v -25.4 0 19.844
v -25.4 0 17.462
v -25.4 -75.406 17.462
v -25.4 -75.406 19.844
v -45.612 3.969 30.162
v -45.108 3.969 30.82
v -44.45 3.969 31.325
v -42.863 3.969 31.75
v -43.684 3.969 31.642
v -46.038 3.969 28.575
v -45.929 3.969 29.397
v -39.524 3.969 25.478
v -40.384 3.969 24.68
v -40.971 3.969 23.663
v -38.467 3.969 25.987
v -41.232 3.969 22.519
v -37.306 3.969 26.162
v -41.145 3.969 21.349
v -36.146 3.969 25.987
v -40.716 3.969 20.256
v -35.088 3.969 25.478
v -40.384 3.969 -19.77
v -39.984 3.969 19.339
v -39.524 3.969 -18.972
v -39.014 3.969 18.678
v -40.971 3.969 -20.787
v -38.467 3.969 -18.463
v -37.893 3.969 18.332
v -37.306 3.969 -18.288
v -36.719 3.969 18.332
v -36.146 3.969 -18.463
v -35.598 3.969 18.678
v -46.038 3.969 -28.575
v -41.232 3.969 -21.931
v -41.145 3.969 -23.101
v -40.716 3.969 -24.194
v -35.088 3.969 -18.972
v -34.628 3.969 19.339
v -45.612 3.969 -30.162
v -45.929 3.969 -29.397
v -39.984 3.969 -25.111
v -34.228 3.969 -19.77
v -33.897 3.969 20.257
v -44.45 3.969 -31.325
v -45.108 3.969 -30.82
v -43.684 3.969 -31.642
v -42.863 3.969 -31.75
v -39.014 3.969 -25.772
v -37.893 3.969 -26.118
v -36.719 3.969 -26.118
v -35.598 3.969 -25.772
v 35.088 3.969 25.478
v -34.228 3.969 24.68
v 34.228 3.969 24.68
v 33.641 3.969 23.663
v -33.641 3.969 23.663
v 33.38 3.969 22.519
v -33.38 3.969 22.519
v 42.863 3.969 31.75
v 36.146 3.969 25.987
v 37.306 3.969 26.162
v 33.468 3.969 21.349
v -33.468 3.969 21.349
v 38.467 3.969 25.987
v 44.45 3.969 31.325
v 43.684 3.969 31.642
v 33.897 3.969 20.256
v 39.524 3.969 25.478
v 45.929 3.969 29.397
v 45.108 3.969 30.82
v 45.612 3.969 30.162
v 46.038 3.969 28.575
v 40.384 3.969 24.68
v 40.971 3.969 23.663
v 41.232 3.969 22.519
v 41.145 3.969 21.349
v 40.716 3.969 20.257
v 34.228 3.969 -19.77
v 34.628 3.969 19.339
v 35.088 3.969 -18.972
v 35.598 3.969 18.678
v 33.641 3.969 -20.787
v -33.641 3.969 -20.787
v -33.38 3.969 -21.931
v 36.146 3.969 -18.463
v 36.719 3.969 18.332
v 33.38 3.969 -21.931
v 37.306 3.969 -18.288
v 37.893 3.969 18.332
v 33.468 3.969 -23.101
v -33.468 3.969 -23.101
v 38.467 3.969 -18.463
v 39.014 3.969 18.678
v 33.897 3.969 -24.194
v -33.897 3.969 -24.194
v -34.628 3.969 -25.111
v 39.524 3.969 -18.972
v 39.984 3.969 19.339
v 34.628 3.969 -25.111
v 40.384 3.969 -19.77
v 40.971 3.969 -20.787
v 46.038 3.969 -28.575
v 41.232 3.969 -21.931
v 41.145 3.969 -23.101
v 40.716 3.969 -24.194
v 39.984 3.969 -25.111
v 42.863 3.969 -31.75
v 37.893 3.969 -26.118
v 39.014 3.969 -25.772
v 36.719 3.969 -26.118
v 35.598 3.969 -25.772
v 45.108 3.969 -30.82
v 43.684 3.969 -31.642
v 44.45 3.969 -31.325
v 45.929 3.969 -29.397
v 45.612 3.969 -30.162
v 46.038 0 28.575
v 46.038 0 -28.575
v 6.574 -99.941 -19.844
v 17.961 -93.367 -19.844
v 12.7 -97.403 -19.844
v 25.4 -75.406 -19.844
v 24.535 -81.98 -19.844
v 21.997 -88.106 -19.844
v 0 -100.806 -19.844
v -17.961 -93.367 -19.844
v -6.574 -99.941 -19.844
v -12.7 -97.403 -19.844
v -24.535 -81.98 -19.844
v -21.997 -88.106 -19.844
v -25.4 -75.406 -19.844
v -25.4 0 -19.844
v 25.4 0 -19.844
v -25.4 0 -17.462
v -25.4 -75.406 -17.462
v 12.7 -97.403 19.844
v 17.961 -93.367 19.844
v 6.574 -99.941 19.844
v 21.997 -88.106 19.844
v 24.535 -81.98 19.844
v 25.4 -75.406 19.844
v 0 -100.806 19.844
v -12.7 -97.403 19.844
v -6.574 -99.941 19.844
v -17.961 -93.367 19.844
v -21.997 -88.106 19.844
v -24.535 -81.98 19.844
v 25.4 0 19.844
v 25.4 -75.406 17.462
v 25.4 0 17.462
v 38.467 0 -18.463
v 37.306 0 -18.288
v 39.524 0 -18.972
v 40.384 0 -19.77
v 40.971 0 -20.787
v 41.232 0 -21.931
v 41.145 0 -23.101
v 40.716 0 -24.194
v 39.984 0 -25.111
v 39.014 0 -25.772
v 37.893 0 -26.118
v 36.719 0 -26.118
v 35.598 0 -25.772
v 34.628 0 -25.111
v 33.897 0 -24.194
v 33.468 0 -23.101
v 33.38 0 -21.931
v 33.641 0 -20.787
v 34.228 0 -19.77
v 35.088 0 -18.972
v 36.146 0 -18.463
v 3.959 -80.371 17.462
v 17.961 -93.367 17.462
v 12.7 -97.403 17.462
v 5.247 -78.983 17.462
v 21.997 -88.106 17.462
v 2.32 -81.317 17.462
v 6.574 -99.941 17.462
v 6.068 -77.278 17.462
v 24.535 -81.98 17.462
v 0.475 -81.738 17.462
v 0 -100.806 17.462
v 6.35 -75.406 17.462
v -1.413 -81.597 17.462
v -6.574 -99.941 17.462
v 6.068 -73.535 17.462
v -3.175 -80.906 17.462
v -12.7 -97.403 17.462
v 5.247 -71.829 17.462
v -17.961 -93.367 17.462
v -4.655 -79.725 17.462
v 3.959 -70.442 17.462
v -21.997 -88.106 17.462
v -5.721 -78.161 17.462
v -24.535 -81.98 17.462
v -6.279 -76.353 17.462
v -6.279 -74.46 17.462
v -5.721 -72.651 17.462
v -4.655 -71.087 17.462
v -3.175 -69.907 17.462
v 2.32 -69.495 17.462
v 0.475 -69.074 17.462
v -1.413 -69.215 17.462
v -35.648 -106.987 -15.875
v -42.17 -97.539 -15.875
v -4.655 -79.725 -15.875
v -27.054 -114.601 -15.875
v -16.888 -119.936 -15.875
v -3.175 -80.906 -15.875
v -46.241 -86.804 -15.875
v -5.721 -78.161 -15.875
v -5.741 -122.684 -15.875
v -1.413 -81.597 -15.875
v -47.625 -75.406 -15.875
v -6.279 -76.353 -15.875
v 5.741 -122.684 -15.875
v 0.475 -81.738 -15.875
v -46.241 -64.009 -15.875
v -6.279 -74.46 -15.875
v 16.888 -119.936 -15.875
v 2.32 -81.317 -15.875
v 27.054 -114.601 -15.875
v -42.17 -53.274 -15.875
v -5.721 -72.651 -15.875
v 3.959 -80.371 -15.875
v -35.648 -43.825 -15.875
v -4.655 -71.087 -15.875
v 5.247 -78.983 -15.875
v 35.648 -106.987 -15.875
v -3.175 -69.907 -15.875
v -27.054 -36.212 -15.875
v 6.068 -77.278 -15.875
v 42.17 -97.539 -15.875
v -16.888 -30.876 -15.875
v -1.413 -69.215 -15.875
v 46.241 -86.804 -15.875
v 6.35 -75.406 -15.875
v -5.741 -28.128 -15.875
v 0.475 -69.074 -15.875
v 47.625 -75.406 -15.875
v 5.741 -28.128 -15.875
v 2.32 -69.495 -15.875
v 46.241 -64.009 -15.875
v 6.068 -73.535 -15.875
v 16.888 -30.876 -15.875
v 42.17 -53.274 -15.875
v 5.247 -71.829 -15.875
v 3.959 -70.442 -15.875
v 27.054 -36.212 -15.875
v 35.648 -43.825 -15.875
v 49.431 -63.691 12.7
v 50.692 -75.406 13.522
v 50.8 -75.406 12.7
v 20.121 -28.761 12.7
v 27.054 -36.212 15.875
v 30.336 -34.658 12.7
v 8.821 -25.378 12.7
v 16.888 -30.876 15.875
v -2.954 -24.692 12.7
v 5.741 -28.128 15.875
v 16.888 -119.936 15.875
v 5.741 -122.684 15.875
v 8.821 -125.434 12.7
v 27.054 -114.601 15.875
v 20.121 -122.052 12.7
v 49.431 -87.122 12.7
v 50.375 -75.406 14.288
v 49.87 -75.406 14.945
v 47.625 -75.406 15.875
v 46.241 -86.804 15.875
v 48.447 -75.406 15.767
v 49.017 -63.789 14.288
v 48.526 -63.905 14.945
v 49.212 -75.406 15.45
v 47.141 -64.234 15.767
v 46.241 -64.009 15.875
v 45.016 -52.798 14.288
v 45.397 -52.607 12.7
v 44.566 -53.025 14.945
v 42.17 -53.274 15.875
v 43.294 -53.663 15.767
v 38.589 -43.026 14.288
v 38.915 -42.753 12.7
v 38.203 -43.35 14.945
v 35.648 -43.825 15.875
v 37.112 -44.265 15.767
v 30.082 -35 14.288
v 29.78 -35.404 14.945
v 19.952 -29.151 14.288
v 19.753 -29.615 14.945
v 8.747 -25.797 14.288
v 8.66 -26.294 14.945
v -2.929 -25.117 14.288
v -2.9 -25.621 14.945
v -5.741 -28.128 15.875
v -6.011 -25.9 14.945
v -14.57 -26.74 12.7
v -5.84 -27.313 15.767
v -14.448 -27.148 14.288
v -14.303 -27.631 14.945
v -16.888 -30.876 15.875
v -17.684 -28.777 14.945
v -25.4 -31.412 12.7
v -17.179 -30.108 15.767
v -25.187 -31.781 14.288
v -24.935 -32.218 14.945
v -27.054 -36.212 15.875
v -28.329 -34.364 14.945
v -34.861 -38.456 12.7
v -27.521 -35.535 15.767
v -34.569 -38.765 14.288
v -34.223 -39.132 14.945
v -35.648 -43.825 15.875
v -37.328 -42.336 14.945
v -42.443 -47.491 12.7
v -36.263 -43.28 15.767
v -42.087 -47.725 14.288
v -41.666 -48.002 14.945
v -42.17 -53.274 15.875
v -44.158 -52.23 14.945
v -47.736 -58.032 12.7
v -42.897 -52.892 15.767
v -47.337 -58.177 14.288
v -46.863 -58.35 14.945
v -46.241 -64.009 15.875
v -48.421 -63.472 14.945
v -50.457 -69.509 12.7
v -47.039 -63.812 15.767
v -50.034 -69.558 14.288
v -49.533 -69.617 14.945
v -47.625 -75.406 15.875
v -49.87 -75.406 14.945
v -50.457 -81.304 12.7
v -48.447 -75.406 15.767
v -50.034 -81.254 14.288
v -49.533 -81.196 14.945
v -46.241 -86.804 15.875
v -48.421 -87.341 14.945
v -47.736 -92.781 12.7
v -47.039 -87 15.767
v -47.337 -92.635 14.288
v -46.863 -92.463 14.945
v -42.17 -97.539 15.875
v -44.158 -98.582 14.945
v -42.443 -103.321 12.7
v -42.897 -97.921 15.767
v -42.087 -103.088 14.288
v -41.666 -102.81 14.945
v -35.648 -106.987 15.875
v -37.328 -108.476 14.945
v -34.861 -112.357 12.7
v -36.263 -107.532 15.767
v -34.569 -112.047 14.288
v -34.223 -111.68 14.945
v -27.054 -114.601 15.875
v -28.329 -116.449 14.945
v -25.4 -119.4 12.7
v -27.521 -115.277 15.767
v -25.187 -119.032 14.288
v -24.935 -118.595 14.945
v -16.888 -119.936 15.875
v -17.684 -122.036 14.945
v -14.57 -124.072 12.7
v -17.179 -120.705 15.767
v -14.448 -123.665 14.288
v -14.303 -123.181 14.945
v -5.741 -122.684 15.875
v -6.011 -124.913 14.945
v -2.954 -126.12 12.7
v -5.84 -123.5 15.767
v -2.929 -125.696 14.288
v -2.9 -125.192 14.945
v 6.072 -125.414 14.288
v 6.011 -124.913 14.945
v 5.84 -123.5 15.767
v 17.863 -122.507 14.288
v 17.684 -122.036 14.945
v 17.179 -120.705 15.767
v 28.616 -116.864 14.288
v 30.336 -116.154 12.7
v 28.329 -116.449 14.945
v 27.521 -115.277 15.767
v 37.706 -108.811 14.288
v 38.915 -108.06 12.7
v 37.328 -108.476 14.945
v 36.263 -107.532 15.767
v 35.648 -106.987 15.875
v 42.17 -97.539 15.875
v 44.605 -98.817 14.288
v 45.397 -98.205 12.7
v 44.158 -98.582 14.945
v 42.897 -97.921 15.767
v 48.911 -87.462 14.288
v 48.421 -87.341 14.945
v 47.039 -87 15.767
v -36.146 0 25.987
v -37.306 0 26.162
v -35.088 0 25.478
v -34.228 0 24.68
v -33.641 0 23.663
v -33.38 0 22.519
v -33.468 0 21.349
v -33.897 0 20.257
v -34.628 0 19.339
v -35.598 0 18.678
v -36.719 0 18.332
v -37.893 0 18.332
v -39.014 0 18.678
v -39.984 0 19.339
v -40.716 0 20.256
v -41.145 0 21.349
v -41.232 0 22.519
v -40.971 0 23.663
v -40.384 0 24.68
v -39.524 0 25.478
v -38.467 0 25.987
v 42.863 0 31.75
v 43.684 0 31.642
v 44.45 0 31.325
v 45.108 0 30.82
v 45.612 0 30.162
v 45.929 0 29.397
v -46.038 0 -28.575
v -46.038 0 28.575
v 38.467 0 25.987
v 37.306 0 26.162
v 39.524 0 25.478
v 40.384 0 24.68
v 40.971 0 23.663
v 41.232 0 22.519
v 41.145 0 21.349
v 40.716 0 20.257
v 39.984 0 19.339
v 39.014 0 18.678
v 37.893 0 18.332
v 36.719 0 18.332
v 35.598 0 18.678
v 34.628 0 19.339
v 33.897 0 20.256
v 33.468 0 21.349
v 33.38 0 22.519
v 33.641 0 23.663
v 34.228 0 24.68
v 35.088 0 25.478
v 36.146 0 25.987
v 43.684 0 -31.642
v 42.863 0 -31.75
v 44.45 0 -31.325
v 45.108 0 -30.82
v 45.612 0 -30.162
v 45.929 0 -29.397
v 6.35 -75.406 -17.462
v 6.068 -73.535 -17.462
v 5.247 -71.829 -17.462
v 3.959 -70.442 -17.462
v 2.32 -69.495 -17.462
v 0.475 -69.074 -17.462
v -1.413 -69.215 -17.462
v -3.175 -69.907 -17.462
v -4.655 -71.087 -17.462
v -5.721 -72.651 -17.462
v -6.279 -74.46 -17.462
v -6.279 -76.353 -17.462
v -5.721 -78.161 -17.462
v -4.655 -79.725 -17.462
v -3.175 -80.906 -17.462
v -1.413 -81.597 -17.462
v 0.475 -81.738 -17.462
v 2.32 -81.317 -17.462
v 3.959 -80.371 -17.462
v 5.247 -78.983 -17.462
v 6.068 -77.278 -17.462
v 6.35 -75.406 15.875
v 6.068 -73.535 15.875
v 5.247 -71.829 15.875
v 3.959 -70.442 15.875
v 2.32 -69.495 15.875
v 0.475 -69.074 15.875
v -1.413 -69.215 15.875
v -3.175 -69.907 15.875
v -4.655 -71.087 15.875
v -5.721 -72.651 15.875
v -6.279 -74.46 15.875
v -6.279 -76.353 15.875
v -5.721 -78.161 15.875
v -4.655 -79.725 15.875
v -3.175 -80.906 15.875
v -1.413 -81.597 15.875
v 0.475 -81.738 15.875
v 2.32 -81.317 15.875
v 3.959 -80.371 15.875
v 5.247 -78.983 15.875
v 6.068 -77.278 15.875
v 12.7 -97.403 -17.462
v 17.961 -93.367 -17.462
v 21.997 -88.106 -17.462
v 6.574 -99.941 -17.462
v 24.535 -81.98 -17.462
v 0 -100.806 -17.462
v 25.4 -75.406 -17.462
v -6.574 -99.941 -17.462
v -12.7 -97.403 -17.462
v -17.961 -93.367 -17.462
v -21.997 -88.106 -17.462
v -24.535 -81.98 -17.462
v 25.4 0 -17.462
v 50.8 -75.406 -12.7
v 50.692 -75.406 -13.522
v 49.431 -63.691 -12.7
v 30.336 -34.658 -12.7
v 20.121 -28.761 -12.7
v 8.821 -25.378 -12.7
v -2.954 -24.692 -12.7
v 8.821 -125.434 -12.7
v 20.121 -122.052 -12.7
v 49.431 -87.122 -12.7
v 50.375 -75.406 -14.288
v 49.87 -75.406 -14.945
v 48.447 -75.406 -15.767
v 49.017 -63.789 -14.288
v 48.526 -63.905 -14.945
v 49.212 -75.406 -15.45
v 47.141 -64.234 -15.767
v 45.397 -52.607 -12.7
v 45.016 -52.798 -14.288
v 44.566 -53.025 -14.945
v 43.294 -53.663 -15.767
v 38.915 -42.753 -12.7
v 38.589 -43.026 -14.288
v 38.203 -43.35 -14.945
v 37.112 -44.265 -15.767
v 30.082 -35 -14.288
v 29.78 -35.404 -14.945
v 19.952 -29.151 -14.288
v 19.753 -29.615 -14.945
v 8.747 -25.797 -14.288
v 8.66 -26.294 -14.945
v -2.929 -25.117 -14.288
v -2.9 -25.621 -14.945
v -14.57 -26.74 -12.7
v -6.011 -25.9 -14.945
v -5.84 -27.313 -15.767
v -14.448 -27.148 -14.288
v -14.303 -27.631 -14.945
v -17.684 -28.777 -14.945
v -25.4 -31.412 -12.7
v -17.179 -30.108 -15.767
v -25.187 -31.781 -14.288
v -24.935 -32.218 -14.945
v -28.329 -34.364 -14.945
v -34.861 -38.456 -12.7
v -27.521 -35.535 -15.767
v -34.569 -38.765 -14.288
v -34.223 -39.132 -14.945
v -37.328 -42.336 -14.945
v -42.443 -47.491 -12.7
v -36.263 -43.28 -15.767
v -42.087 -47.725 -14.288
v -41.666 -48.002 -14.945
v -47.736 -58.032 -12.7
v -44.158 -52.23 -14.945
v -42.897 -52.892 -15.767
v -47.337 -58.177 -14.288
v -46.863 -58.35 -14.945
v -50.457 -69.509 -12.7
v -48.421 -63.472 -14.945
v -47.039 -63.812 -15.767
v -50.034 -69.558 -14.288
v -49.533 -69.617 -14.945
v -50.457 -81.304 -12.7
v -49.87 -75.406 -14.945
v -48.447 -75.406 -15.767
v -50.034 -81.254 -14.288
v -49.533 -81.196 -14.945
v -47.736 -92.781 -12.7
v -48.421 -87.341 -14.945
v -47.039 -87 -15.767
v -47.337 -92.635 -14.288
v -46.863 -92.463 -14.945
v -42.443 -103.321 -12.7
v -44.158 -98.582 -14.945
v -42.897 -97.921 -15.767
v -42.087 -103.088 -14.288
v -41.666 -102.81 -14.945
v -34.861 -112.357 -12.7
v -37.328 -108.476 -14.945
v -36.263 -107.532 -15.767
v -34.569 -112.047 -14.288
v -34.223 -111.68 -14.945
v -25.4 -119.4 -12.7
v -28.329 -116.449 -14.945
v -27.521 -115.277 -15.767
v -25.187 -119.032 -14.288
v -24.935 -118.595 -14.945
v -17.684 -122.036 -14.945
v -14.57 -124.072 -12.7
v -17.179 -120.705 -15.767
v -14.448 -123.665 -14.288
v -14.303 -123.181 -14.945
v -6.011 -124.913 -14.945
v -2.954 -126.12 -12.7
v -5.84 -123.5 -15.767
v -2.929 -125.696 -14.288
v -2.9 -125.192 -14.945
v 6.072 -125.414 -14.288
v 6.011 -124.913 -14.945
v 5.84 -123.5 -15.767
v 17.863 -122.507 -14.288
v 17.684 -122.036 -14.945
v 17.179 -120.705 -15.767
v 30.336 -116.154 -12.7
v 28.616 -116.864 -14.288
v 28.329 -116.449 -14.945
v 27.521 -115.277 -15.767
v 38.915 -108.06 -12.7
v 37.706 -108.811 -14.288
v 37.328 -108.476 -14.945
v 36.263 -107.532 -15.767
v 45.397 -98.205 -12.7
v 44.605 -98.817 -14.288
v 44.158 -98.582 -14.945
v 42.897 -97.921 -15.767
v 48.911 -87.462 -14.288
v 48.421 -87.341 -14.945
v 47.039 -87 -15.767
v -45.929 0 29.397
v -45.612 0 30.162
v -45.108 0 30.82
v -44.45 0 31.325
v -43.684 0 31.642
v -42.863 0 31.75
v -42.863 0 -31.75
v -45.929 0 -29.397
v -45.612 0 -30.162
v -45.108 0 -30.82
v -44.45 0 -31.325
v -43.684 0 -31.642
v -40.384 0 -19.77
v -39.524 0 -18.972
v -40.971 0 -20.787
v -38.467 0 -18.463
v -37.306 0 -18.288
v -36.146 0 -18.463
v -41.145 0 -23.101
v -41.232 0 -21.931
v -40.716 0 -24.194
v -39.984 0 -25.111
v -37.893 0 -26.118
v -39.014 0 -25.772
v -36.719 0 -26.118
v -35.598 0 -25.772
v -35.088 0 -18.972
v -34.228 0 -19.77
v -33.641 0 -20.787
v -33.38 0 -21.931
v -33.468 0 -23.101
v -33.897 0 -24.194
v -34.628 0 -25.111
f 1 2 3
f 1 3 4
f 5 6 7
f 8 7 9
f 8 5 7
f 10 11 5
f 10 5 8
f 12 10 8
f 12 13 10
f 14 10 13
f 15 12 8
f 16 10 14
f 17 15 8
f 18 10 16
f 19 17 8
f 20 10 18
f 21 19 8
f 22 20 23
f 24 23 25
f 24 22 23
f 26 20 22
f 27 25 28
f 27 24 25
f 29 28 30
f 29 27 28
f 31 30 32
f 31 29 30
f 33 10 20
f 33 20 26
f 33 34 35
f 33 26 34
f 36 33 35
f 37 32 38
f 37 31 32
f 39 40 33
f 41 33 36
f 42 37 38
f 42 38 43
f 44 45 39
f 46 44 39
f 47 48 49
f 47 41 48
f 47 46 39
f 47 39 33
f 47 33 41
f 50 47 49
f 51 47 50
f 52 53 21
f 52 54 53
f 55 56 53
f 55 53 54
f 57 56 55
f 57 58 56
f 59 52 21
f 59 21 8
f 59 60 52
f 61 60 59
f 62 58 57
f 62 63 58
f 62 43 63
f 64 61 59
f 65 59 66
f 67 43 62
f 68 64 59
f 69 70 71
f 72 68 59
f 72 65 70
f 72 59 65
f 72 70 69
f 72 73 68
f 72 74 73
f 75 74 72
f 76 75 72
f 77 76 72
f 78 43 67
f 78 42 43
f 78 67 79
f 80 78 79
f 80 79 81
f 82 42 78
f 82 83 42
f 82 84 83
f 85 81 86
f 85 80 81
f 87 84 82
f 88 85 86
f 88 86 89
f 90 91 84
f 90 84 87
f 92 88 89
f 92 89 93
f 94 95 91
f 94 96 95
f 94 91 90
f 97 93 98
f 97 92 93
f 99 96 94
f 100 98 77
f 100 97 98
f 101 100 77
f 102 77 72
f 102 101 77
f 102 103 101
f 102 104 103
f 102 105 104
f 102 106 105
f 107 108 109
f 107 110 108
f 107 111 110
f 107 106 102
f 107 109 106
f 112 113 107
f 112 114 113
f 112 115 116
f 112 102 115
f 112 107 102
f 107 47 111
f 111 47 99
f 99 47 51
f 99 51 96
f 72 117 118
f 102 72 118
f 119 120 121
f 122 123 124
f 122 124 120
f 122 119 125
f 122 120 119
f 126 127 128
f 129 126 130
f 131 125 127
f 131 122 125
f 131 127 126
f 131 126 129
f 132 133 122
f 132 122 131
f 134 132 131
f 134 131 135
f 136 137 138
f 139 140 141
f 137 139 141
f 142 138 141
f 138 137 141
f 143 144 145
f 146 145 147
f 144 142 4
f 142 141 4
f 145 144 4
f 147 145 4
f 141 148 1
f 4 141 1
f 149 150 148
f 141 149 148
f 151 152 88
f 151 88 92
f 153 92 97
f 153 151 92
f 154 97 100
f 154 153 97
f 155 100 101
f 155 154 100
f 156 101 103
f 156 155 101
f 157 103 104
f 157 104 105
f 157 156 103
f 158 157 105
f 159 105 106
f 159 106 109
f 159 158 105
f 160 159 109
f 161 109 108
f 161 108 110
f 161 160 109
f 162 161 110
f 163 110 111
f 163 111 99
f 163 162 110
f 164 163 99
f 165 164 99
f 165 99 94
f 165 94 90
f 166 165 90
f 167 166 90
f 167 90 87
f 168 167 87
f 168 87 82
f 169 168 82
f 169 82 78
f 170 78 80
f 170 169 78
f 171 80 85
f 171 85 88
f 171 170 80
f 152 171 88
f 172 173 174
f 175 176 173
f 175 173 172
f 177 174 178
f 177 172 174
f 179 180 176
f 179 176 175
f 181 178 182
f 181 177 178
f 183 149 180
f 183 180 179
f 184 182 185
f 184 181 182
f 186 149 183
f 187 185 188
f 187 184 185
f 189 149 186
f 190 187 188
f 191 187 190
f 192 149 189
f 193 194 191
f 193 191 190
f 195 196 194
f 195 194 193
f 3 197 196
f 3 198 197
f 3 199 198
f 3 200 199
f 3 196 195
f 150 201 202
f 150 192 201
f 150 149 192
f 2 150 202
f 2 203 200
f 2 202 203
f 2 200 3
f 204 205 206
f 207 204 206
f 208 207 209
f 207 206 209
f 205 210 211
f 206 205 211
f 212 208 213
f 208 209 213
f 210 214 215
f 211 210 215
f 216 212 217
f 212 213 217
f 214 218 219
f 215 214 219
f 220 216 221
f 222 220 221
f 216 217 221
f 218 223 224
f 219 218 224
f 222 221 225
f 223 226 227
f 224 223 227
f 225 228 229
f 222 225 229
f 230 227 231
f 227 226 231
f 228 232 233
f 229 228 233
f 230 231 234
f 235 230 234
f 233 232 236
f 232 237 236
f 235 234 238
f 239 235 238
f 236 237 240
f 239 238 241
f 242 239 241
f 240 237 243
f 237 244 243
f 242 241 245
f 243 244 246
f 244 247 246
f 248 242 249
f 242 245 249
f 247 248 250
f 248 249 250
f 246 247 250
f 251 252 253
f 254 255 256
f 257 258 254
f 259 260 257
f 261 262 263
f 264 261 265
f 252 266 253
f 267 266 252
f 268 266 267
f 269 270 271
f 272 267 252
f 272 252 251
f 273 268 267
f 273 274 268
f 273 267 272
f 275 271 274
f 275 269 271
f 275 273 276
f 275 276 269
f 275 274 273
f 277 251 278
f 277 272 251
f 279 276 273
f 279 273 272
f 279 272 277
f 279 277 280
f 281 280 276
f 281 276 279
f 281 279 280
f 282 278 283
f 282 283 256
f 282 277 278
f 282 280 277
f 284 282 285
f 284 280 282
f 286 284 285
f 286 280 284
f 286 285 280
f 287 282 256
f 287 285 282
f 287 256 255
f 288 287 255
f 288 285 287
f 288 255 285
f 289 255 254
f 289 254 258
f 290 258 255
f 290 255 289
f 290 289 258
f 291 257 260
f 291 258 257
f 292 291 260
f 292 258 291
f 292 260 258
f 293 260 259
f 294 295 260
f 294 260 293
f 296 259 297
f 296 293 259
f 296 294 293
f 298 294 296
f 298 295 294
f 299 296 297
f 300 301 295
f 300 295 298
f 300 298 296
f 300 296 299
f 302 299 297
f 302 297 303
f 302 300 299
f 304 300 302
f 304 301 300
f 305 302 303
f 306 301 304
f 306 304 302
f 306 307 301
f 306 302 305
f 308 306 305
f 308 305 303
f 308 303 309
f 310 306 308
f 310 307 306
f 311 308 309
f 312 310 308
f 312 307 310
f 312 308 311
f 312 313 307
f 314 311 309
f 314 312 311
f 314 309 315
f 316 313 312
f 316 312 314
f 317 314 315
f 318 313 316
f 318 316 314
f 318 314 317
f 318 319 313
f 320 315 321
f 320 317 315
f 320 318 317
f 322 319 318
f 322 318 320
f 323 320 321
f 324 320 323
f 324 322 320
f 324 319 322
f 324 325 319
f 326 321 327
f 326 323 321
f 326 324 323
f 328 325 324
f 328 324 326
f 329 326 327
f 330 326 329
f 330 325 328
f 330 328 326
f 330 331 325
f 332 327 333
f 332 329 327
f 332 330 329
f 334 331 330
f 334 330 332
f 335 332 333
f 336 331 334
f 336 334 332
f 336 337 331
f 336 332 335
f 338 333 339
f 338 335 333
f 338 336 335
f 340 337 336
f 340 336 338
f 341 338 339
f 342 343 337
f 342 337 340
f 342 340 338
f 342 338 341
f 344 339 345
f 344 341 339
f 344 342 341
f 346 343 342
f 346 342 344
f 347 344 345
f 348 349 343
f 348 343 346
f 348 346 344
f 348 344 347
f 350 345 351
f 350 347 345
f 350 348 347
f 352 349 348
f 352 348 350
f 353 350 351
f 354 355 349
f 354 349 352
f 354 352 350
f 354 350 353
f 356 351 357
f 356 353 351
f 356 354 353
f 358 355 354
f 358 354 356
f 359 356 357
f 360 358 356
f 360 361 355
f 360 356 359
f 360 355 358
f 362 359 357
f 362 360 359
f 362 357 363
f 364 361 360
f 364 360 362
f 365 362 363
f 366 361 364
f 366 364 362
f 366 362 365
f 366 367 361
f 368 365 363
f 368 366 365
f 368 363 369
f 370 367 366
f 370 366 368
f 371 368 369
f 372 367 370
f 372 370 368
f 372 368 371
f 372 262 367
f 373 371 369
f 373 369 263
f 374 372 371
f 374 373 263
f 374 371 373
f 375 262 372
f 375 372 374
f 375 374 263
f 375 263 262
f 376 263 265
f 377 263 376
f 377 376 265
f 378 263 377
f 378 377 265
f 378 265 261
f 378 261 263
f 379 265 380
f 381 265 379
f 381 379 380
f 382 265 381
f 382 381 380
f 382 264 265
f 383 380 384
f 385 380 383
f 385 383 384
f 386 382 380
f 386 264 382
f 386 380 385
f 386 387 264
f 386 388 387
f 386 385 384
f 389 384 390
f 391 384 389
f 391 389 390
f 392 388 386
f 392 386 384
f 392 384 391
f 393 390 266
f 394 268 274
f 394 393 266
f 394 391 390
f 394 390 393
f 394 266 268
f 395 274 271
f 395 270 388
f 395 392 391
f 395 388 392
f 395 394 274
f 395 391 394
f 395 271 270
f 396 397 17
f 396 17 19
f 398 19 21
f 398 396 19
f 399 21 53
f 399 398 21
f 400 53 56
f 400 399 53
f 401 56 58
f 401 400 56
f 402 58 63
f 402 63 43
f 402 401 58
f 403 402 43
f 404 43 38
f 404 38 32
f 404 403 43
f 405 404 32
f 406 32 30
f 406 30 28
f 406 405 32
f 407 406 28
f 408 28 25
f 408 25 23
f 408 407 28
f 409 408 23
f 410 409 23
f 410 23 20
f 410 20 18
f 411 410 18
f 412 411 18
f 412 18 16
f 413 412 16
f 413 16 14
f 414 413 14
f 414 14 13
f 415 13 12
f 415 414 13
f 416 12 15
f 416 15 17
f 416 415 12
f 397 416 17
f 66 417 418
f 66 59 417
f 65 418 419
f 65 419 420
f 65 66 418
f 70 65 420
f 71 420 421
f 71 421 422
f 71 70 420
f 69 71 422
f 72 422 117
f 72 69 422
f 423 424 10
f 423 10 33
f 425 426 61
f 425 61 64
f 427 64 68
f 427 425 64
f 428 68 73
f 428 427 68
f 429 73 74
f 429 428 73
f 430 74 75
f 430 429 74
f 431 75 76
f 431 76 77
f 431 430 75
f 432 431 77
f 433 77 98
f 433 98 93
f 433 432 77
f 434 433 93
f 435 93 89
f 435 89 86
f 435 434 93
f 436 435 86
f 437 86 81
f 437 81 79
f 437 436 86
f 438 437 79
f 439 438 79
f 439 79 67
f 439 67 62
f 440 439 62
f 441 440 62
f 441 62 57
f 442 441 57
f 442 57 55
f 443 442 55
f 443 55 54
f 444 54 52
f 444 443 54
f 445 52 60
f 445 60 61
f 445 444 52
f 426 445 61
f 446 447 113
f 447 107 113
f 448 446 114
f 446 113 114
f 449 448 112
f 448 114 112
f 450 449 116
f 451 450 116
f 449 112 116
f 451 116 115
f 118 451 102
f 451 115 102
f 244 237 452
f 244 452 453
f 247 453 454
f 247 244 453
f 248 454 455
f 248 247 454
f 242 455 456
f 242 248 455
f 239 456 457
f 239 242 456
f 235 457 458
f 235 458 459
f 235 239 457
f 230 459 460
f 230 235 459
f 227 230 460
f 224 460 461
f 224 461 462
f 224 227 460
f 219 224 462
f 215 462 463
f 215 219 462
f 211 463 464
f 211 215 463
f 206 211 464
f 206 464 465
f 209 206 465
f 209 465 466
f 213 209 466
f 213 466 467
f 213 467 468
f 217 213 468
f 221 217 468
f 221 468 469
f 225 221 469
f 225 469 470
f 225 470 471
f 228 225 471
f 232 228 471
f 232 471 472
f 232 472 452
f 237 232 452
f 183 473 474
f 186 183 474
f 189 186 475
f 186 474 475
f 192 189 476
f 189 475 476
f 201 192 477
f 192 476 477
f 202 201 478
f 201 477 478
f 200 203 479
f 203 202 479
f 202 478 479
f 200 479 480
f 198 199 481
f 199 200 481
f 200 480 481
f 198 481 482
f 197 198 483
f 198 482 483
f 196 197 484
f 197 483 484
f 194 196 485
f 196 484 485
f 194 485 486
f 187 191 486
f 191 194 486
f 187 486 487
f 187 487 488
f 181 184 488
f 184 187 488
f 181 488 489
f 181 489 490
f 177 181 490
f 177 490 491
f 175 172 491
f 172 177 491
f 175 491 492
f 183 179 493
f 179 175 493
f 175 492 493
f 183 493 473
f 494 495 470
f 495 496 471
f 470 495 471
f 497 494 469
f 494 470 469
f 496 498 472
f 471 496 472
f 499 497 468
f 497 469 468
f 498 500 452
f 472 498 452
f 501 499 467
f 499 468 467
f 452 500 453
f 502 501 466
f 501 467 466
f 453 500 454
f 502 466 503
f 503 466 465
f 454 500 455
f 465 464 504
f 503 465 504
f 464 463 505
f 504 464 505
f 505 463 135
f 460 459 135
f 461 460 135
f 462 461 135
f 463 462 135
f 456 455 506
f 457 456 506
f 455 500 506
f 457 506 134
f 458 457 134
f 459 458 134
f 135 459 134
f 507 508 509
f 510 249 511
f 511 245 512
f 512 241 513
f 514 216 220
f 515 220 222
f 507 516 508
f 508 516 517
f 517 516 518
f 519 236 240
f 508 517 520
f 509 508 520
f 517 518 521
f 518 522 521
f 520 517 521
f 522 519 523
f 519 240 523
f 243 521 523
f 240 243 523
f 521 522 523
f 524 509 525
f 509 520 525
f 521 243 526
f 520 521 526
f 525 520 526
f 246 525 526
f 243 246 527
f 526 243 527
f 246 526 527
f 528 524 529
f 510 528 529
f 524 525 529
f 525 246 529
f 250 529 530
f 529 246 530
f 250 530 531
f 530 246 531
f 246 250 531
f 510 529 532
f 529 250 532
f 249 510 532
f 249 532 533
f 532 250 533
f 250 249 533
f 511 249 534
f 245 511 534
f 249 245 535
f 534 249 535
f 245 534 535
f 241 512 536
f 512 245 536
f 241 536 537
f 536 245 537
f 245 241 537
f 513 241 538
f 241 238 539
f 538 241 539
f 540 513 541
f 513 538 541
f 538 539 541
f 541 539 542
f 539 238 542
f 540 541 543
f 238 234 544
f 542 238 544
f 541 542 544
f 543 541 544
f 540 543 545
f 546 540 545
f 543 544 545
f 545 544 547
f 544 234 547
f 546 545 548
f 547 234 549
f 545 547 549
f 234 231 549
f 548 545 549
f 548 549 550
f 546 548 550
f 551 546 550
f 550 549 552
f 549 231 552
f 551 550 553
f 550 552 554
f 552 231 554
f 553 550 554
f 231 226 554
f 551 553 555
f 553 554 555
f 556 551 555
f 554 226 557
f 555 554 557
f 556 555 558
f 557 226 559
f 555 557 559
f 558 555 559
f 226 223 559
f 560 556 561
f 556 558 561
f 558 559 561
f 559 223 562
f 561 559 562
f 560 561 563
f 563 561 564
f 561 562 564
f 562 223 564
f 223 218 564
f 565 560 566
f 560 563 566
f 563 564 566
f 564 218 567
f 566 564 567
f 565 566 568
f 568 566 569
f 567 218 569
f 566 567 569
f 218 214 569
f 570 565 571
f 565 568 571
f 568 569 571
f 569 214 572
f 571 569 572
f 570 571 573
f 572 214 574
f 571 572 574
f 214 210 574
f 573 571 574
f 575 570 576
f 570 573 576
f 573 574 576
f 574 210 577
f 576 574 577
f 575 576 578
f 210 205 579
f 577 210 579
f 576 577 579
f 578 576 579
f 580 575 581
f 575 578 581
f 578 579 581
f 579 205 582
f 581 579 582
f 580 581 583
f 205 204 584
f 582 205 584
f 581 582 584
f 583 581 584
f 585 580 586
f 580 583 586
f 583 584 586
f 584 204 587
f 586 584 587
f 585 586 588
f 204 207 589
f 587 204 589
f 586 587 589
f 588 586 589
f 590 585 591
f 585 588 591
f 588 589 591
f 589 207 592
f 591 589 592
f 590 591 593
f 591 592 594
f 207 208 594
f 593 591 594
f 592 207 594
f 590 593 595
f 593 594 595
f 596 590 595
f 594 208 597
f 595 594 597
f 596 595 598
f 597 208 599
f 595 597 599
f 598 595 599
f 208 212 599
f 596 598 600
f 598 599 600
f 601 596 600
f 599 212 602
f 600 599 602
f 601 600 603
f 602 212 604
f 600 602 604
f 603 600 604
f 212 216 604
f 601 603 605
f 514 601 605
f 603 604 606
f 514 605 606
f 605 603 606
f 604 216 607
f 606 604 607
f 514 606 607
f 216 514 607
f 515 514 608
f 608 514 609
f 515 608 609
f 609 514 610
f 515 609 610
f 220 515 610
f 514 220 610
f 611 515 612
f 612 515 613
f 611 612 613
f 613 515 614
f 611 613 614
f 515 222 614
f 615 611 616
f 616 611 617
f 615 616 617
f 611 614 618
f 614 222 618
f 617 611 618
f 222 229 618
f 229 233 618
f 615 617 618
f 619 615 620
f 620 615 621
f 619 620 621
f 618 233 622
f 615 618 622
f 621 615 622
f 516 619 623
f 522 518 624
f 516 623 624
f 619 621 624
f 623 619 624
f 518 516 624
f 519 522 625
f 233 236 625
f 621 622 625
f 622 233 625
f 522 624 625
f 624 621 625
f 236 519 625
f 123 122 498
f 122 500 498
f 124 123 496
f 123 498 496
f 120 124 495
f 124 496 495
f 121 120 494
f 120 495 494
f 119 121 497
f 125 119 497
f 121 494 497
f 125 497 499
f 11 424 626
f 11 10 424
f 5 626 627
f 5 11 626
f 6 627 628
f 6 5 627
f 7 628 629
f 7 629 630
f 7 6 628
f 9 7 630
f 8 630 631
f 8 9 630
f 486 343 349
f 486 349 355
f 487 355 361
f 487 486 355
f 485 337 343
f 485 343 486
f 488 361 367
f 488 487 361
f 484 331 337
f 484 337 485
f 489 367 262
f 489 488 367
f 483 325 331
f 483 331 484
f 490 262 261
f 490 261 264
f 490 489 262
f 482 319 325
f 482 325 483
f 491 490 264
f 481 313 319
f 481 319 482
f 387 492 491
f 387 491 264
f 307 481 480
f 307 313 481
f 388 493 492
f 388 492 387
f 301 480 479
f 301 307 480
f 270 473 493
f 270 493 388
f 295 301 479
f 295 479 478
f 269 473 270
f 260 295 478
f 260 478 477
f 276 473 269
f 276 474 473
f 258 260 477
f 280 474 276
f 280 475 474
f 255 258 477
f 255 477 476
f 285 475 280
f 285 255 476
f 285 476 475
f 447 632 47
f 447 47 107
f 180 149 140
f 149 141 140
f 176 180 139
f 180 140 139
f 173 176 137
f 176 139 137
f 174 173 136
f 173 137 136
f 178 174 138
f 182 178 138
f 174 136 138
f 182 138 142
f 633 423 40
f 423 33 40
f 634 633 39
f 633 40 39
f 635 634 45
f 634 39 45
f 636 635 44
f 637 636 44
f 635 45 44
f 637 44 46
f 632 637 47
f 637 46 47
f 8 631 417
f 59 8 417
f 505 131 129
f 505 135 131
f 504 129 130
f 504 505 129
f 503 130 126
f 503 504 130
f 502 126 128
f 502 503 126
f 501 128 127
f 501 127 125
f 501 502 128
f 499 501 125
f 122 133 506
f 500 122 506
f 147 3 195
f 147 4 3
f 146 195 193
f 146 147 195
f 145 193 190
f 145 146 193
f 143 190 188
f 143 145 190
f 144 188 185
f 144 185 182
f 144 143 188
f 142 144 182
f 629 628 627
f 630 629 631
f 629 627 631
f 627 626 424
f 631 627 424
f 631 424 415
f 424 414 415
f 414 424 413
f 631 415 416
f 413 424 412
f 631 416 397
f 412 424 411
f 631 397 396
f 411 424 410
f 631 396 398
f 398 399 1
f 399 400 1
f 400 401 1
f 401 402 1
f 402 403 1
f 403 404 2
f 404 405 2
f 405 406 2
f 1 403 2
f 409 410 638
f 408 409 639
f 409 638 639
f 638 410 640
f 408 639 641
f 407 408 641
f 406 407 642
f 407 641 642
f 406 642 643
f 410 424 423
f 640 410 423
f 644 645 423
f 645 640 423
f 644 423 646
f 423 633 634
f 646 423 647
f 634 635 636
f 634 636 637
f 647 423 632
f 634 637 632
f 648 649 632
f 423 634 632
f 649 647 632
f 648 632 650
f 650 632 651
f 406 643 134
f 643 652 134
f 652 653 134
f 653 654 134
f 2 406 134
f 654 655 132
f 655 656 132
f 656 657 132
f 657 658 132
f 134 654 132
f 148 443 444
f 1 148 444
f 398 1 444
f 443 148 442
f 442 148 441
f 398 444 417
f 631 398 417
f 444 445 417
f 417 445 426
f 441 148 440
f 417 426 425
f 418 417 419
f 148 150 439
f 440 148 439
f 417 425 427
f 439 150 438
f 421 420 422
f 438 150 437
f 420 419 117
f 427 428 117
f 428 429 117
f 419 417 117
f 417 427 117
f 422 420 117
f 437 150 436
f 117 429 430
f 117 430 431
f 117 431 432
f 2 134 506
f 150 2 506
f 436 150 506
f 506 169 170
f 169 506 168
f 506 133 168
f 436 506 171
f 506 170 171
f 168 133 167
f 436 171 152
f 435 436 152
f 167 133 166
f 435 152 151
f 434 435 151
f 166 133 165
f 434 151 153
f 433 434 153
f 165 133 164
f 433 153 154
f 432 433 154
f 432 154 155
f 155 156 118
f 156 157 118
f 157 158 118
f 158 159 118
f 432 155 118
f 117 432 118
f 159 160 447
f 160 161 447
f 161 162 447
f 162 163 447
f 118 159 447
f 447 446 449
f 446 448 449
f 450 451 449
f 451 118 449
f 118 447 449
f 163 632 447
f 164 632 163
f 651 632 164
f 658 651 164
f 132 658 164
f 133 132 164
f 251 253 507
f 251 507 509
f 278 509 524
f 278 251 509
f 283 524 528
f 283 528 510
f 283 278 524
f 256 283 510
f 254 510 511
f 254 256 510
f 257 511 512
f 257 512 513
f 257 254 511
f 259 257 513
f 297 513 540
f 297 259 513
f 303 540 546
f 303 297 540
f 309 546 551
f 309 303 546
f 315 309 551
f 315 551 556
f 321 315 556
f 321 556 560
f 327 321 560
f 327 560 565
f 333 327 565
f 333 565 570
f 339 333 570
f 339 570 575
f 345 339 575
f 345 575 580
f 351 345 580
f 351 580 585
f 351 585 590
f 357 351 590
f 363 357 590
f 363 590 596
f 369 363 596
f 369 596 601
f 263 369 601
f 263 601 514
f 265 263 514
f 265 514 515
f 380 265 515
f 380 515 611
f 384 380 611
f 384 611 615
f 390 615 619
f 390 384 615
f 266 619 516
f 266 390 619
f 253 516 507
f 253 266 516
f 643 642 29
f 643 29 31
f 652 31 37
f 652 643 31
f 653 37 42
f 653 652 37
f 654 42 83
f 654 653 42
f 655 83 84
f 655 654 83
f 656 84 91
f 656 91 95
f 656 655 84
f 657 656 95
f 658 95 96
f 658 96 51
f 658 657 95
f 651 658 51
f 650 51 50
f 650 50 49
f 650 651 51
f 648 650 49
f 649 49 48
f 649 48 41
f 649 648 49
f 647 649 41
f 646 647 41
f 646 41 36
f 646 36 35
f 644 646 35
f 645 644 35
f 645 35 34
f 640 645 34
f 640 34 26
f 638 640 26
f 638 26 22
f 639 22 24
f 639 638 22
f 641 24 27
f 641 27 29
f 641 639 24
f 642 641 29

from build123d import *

# Parameters (mm, degrees)
SKETCH1_W                  = 92.075
SKETCH1_H                  = 63.5
SKETCH1_R                  = 3.937
EXTRUDE1_DEPTH             = 3.96875
SKETCH2_W                  = 50.8
SKETCH2_H                  = 2.38125
EXTRUDE2_DEPTH             = 100.80625
FILLET1_R                  = 25.4
EXTRUDE3_REACH             = 117.28
SKETCH3_R                  = 6.35
EXTRUDE3_DIRECTION_2_REACH = 117.28
SKETCH4_R                  = 50.8
EXTRUDE4_DEPTH             = 15.875
FILLET2_R                  = 3.175
FILLET3_R                  = 3.175


with BuildPart() as part:
    # Sketch1 → Extrude1 (new body)
    with BuildSketch(Plane(origin=(0, 0, 0), x_dir=(1, 0, 0), z_dir=(0, 1, 0))):
        Rectangle(SKETCH1_W, SKETCH1_H)
        with Locations(Location((-37.30625, 22.225, 0), (0, 0, 270))):
            Circle(SKETCH1_R, mode=Mode.SUBTRACT)
        with Locations(Location((-37.30625, -22.225, 0), (0, 0, 270))):
            Circle(SKETCH1_R, mode=Mode.SUBTRACT)
        with Locations(Location((37.30625, -22.225, 0), (0, 0, 270))):
            Circle(SKETCH1_R, mode=Mode.SUBTRACT)
        with Locations(Location((37.30625, 22.225, 0), (0, 0, 270))):
            Circle(SKETCH1_R, mode=Mode.SUBTRACT)
    extrude(amount=EXTRUDE1_DEPTH)

    # Sketch2 → Extrude2 (add)
    with BuildSketch(Plane(origin=(0, 0, 0), x_dir=(-1, 0, 0), z_dir=(0, 1, 0))):
        with Locations((0, 18.653125)):
            Rectangle(SKETCH2_W, SKETCH2_H)
        with Locations((0, -18.653125)):
            Rectangle(SKETCH2_W, SKETCH2_H)
    extrude(amount=-EXTRUDE2_DEPTH)

    # Fillet1
    fillet1_edges = [part.edges().sort_by_distance(p)[0] for p in [
        (-25.4, -100.80625, 18.653125),
        (-25.4, -100.80625, -18.653125),
        (25.4, -100.80625, -18.653125),
        (25.4, -100.80625, 18.653125),
    ]]
    fillet(fillet1_edges, radius=FILLET1_R - 0.0001)  # a hair under: the kernel refuses the full size

    # Sketch3 → Extrude3 (add, up to next)
    with BuildSketch(Plane.XY, mode=Mode.PRIVATE) as extrude3_sk1:
        with Locations((0, -75.40625)):
            Circle(SKETCH3_R)
    extrude3_tool1 = extrude(extrude3_sk1.sketch, amount=EXTRUDE3_REACH, mode=Mode.PRIVATE) - part.part
    add(extrude3_tool1.solids().sort_by_distance((0, -75.40625, 0))[0])

    # Sketch3 → Extrude3 direction 2 (add, up to next)
    with BuildSketch(Plane.XY, mode=Mode.PRIVATE) as extrude3_direction_2_sk1:
        with Locations((0, -75.40625)):
            Circle(SKETCH3_R)
    extrude3_direction_2_tool1 = extrude(extrude3_direction_2_sk1.sketch, amount=-EXTRUDE3_DIRECTION_2_REACH, mode=Mode.PRIVATE) - part.part
    add(extrude3_direction_2_tool1.solids().sort_by_distance((0, -75.40625, 0))[0])

    # Sketch4 → Extrude4 (add, symmetric)
    with BuildSketch(Plane.XY):
        with Locations((0, -75.40625)):
            Circle(SKETCH4_R)
    extrude(amount=EXTRUDE4_DEPTH, both=True)

    # Fillet2
    fillet2_edges = [part.edges().sort_by_distance(p)[0] for p in [
        (-50.8, -75.40625, -15.875),
        (-50.8, -75.40625, 15.875),
    ]]
    fillet(fillet2_edges, radius=FILLET2_R)

    # Fillet3
    fillet3_edges = [part.edges().sort_by_distance(p)[0] for p in [
        (-46.0375, 1.984375, -31.75),
        (46.0375, 1.984375, -31.75),
        (46.0375, 1.984375, 31.75),
        (-46.0375, 1.984375, 31.75),
    ]]
    fillet(fillet3_edges, radius=FILLET3_R)


solid = part.part
